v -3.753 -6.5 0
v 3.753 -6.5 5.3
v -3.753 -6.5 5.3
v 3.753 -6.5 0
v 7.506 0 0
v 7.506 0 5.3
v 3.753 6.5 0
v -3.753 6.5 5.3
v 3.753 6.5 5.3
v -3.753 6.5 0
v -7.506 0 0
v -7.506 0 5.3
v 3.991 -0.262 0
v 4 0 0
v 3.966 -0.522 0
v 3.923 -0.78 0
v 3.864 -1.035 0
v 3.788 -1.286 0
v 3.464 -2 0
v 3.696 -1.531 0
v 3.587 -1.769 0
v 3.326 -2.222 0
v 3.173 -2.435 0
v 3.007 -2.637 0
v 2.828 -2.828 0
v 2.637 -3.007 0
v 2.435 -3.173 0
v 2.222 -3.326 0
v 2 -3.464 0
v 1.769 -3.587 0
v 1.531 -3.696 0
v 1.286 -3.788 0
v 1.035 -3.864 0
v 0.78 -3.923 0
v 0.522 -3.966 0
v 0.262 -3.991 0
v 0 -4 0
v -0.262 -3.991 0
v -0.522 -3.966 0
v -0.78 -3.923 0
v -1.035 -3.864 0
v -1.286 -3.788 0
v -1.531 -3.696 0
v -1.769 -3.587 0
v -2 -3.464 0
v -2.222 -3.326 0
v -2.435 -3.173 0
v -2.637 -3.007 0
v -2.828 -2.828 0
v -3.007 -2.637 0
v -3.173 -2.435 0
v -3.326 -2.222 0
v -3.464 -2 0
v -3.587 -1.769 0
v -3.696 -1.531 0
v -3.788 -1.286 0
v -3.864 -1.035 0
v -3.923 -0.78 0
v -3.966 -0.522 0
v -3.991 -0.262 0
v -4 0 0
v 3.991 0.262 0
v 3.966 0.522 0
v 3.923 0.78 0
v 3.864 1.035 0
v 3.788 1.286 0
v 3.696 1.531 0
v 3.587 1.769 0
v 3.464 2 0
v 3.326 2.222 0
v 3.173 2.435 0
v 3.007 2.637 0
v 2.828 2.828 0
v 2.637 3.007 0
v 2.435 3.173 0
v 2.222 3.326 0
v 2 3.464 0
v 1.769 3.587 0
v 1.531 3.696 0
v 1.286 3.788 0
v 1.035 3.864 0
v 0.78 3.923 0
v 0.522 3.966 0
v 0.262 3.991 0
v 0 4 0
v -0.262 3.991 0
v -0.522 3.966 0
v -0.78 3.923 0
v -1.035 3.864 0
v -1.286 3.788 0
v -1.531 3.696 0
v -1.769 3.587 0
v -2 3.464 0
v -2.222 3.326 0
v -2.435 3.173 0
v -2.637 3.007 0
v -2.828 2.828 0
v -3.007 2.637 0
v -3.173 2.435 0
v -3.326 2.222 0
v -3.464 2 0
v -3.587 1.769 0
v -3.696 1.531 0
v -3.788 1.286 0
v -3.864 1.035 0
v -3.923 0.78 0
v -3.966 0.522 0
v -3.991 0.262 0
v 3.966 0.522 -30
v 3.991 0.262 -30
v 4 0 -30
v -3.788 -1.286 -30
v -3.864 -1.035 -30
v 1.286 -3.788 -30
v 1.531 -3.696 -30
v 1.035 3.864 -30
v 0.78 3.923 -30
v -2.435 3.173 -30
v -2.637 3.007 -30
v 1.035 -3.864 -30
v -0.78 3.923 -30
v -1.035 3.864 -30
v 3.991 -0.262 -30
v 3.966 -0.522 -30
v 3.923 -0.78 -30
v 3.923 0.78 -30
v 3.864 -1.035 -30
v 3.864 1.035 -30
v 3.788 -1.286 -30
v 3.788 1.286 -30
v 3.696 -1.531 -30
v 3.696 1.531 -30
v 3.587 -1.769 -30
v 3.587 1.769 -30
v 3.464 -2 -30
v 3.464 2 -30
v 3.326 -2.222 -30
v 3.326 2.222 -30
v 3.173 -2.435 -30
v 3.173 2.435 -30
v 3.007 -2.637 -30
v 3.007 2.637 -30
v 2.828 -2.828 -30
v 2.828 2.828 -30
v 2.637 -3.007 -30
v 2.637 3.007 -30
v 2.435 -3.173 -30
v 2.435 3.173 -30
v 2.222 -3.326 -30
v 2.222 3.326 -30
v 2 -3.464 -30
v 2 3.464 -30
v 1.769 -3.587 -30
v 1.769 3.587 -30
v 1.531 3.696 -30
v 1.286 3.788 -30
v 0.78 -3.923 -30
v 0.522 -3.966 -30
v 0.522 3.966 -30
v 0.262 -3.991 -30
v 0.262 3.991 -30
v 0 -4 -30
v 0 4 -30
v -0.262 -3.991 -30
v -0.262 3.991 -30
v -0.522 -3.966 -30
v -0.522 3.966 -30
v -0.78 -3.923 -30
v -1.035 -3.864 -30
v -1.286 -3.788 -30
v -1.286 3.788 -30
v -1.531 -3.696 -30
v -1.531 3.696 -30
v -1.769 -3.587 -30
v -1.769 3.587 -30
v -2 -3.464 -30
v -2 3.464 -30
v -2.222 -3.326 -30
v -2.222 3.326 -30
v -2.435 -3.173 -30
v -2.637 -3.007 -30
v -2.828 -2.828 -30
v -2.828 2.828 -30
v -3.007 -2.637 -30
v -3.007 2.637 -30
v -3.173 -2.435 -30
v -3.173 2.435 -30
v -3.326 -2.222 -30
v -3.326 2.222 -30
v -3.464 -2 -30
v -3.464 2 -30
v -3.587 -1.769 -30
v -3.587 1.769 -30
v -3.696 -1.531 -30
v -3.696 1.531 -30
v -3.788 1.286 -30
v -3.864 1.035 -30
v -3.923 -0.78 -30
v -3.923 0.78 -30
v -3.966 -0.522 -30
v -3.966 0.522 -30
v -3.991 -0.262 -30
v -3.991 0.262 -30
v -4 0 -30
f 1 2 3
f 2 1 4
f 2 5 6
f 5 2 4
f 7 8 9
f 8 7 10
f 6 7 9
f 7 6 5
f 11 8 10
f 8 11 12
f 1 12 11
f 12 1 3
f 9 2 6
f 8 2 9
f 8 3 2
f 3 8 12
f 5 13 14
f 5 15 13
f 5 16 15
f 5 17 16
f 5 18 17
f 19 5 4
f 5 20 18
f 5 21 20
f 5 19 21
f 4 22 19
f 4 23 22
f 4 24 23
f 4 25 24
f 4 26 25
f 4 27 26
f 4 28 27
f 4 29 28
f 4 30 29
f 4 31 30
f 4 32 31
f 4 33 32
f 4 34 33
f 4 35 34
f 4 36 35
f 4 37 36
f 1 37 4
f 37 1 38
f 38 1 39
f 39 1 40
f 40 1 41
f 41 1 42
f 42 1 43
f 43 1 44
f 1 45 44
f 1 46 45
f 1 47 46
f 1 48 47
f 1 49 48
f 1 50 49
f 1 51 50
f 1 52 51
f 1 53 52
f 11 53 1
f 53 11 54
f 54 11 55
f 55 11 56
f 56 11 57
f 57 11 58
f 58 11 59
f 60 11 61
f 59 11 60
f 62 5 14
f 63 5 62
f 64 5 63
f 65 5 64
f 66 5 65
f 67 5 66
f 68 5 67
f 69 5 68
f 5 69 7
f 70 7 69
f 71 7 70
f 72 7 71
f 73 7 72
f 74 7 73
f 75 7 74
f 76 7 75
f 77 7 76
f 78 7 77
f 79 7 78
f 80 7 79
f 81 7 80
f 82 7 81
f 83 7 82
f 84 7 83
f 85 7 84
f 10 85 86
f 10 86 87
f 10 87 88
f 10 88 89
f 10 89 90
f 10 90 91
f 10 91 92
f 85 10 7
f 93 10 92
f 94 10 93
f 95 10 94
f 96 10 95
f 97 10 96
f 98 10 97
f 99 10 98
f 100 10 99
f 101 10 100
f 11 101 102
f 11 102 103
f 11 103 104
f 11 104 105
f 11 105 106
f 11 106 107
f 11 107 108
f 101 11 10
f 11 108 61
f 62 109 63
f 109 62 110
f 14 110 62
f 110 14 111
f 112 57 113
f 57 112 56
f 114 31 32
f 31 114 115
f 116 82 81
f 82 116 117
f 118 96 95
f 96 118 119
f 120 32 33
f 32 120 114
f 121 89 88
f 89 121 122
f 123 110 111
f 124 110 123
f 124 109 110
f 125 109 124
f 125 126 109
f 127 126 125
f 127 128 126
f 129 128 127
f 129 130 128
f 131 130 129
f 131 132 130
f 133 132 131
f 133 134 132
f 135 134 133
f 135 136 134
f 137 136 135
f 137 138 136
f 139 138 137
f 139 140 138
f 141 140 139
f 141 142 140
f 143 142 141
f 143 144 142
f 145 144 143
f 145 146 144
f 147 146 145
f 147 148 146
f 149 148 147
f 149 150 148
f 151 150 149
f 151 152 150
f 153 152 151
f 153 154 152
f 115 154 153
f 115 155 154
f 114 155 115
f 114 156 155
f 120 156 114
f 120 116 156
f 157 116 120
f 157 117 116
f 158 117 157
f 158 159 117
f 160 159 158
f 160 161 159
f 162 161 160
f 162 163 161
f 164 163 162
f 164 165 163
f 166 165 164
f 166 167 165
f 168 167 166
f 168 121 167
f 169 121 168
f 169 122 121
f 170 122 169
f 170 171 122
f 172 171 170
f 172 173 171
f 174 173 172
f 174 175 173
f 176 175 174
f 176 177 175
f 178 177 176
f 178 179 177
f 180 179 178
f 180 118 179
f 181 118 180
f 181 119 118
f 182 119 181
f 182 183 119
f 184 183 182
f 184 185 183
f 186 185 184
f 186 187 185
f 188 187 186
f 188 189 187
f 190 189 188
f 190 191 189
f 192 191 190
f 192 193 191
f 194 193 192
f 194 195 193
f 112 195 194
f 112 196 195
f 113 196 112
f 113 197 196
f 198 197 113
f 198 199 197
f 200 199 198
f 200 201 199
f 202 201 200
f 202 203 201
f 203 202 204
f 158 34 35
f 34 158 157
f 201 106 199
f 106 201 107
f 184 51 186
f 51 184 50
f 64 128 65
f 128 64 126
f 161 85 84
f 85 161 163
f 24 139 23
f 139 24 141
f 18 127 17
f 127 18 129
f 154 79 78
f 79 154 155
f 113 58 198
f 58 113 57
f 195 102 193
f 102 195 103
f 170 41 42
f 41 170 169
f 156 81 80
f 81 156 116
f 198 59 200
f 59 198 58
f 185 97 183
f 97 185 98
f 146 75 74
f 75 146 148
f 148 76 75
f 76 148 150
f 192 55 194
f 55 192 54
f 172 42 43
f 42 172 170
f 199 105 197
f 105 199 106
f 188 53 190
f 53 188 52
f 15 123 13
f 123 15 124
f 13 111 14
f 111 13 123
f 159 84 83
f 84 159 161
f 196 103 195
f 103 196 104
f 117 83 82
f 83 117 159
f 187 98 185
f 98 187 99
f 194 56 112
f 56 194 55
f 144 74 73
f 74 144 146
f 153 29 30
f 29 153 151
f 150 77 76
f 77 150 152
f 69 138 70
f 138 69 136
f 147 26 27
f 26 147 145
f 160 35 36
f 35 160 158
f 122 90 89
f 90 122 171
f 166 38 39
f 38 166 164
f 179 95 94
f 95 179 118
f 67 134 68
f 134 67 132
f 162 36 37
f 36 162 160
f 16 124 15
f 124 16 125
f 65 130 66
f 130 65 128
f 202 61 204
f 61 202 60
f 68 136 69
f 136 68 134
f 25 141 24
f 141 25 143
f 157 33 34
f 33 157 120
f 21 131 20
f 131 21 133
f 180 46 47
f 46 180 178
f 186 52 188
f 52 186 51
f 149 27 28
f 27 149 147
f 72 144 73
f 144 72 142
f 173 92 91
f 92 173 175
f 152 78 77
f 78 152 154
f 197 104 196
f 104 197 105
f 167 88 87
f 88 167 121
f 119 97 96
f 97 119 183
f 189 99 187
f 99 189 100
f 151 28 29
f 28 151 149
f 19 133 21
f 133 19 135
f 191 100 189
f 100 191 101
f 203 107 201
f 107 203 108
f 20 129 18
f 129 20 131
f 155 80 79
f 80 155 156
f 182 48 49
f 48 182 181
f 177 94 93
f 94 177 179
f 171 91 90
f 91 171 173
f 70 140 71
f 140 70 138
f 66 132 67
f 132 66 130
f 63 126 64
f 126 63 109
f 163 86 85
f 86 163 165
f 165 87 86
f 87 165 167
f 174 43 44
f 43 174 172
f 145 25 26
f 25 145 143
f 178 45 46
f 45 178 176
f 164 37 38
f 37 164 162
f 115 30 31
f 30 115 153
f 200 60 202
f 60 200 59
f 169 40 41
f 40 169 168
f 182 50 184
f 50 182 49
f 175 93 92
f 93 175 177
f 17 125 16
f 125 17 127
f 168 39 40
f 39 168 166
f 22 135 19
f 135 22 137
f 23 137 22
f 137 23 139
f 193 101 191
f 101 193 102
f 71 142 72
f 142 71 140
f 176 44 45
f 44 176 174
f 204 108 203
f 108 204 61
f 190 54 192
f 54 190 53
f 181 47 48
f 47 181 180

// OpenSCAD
union() {
    // 六角頭部：対辺距離 13 mm、高さ 5.3 mm
    cylinder(h = 5.3, r = 13 / sqrt(3), $fn = 6);

    // シャンク：直径 8 mm、長さ 30 mm
    translate([0, 0, -30])
        cylinder(h = 30, d = 8, $fn = 96);
}
